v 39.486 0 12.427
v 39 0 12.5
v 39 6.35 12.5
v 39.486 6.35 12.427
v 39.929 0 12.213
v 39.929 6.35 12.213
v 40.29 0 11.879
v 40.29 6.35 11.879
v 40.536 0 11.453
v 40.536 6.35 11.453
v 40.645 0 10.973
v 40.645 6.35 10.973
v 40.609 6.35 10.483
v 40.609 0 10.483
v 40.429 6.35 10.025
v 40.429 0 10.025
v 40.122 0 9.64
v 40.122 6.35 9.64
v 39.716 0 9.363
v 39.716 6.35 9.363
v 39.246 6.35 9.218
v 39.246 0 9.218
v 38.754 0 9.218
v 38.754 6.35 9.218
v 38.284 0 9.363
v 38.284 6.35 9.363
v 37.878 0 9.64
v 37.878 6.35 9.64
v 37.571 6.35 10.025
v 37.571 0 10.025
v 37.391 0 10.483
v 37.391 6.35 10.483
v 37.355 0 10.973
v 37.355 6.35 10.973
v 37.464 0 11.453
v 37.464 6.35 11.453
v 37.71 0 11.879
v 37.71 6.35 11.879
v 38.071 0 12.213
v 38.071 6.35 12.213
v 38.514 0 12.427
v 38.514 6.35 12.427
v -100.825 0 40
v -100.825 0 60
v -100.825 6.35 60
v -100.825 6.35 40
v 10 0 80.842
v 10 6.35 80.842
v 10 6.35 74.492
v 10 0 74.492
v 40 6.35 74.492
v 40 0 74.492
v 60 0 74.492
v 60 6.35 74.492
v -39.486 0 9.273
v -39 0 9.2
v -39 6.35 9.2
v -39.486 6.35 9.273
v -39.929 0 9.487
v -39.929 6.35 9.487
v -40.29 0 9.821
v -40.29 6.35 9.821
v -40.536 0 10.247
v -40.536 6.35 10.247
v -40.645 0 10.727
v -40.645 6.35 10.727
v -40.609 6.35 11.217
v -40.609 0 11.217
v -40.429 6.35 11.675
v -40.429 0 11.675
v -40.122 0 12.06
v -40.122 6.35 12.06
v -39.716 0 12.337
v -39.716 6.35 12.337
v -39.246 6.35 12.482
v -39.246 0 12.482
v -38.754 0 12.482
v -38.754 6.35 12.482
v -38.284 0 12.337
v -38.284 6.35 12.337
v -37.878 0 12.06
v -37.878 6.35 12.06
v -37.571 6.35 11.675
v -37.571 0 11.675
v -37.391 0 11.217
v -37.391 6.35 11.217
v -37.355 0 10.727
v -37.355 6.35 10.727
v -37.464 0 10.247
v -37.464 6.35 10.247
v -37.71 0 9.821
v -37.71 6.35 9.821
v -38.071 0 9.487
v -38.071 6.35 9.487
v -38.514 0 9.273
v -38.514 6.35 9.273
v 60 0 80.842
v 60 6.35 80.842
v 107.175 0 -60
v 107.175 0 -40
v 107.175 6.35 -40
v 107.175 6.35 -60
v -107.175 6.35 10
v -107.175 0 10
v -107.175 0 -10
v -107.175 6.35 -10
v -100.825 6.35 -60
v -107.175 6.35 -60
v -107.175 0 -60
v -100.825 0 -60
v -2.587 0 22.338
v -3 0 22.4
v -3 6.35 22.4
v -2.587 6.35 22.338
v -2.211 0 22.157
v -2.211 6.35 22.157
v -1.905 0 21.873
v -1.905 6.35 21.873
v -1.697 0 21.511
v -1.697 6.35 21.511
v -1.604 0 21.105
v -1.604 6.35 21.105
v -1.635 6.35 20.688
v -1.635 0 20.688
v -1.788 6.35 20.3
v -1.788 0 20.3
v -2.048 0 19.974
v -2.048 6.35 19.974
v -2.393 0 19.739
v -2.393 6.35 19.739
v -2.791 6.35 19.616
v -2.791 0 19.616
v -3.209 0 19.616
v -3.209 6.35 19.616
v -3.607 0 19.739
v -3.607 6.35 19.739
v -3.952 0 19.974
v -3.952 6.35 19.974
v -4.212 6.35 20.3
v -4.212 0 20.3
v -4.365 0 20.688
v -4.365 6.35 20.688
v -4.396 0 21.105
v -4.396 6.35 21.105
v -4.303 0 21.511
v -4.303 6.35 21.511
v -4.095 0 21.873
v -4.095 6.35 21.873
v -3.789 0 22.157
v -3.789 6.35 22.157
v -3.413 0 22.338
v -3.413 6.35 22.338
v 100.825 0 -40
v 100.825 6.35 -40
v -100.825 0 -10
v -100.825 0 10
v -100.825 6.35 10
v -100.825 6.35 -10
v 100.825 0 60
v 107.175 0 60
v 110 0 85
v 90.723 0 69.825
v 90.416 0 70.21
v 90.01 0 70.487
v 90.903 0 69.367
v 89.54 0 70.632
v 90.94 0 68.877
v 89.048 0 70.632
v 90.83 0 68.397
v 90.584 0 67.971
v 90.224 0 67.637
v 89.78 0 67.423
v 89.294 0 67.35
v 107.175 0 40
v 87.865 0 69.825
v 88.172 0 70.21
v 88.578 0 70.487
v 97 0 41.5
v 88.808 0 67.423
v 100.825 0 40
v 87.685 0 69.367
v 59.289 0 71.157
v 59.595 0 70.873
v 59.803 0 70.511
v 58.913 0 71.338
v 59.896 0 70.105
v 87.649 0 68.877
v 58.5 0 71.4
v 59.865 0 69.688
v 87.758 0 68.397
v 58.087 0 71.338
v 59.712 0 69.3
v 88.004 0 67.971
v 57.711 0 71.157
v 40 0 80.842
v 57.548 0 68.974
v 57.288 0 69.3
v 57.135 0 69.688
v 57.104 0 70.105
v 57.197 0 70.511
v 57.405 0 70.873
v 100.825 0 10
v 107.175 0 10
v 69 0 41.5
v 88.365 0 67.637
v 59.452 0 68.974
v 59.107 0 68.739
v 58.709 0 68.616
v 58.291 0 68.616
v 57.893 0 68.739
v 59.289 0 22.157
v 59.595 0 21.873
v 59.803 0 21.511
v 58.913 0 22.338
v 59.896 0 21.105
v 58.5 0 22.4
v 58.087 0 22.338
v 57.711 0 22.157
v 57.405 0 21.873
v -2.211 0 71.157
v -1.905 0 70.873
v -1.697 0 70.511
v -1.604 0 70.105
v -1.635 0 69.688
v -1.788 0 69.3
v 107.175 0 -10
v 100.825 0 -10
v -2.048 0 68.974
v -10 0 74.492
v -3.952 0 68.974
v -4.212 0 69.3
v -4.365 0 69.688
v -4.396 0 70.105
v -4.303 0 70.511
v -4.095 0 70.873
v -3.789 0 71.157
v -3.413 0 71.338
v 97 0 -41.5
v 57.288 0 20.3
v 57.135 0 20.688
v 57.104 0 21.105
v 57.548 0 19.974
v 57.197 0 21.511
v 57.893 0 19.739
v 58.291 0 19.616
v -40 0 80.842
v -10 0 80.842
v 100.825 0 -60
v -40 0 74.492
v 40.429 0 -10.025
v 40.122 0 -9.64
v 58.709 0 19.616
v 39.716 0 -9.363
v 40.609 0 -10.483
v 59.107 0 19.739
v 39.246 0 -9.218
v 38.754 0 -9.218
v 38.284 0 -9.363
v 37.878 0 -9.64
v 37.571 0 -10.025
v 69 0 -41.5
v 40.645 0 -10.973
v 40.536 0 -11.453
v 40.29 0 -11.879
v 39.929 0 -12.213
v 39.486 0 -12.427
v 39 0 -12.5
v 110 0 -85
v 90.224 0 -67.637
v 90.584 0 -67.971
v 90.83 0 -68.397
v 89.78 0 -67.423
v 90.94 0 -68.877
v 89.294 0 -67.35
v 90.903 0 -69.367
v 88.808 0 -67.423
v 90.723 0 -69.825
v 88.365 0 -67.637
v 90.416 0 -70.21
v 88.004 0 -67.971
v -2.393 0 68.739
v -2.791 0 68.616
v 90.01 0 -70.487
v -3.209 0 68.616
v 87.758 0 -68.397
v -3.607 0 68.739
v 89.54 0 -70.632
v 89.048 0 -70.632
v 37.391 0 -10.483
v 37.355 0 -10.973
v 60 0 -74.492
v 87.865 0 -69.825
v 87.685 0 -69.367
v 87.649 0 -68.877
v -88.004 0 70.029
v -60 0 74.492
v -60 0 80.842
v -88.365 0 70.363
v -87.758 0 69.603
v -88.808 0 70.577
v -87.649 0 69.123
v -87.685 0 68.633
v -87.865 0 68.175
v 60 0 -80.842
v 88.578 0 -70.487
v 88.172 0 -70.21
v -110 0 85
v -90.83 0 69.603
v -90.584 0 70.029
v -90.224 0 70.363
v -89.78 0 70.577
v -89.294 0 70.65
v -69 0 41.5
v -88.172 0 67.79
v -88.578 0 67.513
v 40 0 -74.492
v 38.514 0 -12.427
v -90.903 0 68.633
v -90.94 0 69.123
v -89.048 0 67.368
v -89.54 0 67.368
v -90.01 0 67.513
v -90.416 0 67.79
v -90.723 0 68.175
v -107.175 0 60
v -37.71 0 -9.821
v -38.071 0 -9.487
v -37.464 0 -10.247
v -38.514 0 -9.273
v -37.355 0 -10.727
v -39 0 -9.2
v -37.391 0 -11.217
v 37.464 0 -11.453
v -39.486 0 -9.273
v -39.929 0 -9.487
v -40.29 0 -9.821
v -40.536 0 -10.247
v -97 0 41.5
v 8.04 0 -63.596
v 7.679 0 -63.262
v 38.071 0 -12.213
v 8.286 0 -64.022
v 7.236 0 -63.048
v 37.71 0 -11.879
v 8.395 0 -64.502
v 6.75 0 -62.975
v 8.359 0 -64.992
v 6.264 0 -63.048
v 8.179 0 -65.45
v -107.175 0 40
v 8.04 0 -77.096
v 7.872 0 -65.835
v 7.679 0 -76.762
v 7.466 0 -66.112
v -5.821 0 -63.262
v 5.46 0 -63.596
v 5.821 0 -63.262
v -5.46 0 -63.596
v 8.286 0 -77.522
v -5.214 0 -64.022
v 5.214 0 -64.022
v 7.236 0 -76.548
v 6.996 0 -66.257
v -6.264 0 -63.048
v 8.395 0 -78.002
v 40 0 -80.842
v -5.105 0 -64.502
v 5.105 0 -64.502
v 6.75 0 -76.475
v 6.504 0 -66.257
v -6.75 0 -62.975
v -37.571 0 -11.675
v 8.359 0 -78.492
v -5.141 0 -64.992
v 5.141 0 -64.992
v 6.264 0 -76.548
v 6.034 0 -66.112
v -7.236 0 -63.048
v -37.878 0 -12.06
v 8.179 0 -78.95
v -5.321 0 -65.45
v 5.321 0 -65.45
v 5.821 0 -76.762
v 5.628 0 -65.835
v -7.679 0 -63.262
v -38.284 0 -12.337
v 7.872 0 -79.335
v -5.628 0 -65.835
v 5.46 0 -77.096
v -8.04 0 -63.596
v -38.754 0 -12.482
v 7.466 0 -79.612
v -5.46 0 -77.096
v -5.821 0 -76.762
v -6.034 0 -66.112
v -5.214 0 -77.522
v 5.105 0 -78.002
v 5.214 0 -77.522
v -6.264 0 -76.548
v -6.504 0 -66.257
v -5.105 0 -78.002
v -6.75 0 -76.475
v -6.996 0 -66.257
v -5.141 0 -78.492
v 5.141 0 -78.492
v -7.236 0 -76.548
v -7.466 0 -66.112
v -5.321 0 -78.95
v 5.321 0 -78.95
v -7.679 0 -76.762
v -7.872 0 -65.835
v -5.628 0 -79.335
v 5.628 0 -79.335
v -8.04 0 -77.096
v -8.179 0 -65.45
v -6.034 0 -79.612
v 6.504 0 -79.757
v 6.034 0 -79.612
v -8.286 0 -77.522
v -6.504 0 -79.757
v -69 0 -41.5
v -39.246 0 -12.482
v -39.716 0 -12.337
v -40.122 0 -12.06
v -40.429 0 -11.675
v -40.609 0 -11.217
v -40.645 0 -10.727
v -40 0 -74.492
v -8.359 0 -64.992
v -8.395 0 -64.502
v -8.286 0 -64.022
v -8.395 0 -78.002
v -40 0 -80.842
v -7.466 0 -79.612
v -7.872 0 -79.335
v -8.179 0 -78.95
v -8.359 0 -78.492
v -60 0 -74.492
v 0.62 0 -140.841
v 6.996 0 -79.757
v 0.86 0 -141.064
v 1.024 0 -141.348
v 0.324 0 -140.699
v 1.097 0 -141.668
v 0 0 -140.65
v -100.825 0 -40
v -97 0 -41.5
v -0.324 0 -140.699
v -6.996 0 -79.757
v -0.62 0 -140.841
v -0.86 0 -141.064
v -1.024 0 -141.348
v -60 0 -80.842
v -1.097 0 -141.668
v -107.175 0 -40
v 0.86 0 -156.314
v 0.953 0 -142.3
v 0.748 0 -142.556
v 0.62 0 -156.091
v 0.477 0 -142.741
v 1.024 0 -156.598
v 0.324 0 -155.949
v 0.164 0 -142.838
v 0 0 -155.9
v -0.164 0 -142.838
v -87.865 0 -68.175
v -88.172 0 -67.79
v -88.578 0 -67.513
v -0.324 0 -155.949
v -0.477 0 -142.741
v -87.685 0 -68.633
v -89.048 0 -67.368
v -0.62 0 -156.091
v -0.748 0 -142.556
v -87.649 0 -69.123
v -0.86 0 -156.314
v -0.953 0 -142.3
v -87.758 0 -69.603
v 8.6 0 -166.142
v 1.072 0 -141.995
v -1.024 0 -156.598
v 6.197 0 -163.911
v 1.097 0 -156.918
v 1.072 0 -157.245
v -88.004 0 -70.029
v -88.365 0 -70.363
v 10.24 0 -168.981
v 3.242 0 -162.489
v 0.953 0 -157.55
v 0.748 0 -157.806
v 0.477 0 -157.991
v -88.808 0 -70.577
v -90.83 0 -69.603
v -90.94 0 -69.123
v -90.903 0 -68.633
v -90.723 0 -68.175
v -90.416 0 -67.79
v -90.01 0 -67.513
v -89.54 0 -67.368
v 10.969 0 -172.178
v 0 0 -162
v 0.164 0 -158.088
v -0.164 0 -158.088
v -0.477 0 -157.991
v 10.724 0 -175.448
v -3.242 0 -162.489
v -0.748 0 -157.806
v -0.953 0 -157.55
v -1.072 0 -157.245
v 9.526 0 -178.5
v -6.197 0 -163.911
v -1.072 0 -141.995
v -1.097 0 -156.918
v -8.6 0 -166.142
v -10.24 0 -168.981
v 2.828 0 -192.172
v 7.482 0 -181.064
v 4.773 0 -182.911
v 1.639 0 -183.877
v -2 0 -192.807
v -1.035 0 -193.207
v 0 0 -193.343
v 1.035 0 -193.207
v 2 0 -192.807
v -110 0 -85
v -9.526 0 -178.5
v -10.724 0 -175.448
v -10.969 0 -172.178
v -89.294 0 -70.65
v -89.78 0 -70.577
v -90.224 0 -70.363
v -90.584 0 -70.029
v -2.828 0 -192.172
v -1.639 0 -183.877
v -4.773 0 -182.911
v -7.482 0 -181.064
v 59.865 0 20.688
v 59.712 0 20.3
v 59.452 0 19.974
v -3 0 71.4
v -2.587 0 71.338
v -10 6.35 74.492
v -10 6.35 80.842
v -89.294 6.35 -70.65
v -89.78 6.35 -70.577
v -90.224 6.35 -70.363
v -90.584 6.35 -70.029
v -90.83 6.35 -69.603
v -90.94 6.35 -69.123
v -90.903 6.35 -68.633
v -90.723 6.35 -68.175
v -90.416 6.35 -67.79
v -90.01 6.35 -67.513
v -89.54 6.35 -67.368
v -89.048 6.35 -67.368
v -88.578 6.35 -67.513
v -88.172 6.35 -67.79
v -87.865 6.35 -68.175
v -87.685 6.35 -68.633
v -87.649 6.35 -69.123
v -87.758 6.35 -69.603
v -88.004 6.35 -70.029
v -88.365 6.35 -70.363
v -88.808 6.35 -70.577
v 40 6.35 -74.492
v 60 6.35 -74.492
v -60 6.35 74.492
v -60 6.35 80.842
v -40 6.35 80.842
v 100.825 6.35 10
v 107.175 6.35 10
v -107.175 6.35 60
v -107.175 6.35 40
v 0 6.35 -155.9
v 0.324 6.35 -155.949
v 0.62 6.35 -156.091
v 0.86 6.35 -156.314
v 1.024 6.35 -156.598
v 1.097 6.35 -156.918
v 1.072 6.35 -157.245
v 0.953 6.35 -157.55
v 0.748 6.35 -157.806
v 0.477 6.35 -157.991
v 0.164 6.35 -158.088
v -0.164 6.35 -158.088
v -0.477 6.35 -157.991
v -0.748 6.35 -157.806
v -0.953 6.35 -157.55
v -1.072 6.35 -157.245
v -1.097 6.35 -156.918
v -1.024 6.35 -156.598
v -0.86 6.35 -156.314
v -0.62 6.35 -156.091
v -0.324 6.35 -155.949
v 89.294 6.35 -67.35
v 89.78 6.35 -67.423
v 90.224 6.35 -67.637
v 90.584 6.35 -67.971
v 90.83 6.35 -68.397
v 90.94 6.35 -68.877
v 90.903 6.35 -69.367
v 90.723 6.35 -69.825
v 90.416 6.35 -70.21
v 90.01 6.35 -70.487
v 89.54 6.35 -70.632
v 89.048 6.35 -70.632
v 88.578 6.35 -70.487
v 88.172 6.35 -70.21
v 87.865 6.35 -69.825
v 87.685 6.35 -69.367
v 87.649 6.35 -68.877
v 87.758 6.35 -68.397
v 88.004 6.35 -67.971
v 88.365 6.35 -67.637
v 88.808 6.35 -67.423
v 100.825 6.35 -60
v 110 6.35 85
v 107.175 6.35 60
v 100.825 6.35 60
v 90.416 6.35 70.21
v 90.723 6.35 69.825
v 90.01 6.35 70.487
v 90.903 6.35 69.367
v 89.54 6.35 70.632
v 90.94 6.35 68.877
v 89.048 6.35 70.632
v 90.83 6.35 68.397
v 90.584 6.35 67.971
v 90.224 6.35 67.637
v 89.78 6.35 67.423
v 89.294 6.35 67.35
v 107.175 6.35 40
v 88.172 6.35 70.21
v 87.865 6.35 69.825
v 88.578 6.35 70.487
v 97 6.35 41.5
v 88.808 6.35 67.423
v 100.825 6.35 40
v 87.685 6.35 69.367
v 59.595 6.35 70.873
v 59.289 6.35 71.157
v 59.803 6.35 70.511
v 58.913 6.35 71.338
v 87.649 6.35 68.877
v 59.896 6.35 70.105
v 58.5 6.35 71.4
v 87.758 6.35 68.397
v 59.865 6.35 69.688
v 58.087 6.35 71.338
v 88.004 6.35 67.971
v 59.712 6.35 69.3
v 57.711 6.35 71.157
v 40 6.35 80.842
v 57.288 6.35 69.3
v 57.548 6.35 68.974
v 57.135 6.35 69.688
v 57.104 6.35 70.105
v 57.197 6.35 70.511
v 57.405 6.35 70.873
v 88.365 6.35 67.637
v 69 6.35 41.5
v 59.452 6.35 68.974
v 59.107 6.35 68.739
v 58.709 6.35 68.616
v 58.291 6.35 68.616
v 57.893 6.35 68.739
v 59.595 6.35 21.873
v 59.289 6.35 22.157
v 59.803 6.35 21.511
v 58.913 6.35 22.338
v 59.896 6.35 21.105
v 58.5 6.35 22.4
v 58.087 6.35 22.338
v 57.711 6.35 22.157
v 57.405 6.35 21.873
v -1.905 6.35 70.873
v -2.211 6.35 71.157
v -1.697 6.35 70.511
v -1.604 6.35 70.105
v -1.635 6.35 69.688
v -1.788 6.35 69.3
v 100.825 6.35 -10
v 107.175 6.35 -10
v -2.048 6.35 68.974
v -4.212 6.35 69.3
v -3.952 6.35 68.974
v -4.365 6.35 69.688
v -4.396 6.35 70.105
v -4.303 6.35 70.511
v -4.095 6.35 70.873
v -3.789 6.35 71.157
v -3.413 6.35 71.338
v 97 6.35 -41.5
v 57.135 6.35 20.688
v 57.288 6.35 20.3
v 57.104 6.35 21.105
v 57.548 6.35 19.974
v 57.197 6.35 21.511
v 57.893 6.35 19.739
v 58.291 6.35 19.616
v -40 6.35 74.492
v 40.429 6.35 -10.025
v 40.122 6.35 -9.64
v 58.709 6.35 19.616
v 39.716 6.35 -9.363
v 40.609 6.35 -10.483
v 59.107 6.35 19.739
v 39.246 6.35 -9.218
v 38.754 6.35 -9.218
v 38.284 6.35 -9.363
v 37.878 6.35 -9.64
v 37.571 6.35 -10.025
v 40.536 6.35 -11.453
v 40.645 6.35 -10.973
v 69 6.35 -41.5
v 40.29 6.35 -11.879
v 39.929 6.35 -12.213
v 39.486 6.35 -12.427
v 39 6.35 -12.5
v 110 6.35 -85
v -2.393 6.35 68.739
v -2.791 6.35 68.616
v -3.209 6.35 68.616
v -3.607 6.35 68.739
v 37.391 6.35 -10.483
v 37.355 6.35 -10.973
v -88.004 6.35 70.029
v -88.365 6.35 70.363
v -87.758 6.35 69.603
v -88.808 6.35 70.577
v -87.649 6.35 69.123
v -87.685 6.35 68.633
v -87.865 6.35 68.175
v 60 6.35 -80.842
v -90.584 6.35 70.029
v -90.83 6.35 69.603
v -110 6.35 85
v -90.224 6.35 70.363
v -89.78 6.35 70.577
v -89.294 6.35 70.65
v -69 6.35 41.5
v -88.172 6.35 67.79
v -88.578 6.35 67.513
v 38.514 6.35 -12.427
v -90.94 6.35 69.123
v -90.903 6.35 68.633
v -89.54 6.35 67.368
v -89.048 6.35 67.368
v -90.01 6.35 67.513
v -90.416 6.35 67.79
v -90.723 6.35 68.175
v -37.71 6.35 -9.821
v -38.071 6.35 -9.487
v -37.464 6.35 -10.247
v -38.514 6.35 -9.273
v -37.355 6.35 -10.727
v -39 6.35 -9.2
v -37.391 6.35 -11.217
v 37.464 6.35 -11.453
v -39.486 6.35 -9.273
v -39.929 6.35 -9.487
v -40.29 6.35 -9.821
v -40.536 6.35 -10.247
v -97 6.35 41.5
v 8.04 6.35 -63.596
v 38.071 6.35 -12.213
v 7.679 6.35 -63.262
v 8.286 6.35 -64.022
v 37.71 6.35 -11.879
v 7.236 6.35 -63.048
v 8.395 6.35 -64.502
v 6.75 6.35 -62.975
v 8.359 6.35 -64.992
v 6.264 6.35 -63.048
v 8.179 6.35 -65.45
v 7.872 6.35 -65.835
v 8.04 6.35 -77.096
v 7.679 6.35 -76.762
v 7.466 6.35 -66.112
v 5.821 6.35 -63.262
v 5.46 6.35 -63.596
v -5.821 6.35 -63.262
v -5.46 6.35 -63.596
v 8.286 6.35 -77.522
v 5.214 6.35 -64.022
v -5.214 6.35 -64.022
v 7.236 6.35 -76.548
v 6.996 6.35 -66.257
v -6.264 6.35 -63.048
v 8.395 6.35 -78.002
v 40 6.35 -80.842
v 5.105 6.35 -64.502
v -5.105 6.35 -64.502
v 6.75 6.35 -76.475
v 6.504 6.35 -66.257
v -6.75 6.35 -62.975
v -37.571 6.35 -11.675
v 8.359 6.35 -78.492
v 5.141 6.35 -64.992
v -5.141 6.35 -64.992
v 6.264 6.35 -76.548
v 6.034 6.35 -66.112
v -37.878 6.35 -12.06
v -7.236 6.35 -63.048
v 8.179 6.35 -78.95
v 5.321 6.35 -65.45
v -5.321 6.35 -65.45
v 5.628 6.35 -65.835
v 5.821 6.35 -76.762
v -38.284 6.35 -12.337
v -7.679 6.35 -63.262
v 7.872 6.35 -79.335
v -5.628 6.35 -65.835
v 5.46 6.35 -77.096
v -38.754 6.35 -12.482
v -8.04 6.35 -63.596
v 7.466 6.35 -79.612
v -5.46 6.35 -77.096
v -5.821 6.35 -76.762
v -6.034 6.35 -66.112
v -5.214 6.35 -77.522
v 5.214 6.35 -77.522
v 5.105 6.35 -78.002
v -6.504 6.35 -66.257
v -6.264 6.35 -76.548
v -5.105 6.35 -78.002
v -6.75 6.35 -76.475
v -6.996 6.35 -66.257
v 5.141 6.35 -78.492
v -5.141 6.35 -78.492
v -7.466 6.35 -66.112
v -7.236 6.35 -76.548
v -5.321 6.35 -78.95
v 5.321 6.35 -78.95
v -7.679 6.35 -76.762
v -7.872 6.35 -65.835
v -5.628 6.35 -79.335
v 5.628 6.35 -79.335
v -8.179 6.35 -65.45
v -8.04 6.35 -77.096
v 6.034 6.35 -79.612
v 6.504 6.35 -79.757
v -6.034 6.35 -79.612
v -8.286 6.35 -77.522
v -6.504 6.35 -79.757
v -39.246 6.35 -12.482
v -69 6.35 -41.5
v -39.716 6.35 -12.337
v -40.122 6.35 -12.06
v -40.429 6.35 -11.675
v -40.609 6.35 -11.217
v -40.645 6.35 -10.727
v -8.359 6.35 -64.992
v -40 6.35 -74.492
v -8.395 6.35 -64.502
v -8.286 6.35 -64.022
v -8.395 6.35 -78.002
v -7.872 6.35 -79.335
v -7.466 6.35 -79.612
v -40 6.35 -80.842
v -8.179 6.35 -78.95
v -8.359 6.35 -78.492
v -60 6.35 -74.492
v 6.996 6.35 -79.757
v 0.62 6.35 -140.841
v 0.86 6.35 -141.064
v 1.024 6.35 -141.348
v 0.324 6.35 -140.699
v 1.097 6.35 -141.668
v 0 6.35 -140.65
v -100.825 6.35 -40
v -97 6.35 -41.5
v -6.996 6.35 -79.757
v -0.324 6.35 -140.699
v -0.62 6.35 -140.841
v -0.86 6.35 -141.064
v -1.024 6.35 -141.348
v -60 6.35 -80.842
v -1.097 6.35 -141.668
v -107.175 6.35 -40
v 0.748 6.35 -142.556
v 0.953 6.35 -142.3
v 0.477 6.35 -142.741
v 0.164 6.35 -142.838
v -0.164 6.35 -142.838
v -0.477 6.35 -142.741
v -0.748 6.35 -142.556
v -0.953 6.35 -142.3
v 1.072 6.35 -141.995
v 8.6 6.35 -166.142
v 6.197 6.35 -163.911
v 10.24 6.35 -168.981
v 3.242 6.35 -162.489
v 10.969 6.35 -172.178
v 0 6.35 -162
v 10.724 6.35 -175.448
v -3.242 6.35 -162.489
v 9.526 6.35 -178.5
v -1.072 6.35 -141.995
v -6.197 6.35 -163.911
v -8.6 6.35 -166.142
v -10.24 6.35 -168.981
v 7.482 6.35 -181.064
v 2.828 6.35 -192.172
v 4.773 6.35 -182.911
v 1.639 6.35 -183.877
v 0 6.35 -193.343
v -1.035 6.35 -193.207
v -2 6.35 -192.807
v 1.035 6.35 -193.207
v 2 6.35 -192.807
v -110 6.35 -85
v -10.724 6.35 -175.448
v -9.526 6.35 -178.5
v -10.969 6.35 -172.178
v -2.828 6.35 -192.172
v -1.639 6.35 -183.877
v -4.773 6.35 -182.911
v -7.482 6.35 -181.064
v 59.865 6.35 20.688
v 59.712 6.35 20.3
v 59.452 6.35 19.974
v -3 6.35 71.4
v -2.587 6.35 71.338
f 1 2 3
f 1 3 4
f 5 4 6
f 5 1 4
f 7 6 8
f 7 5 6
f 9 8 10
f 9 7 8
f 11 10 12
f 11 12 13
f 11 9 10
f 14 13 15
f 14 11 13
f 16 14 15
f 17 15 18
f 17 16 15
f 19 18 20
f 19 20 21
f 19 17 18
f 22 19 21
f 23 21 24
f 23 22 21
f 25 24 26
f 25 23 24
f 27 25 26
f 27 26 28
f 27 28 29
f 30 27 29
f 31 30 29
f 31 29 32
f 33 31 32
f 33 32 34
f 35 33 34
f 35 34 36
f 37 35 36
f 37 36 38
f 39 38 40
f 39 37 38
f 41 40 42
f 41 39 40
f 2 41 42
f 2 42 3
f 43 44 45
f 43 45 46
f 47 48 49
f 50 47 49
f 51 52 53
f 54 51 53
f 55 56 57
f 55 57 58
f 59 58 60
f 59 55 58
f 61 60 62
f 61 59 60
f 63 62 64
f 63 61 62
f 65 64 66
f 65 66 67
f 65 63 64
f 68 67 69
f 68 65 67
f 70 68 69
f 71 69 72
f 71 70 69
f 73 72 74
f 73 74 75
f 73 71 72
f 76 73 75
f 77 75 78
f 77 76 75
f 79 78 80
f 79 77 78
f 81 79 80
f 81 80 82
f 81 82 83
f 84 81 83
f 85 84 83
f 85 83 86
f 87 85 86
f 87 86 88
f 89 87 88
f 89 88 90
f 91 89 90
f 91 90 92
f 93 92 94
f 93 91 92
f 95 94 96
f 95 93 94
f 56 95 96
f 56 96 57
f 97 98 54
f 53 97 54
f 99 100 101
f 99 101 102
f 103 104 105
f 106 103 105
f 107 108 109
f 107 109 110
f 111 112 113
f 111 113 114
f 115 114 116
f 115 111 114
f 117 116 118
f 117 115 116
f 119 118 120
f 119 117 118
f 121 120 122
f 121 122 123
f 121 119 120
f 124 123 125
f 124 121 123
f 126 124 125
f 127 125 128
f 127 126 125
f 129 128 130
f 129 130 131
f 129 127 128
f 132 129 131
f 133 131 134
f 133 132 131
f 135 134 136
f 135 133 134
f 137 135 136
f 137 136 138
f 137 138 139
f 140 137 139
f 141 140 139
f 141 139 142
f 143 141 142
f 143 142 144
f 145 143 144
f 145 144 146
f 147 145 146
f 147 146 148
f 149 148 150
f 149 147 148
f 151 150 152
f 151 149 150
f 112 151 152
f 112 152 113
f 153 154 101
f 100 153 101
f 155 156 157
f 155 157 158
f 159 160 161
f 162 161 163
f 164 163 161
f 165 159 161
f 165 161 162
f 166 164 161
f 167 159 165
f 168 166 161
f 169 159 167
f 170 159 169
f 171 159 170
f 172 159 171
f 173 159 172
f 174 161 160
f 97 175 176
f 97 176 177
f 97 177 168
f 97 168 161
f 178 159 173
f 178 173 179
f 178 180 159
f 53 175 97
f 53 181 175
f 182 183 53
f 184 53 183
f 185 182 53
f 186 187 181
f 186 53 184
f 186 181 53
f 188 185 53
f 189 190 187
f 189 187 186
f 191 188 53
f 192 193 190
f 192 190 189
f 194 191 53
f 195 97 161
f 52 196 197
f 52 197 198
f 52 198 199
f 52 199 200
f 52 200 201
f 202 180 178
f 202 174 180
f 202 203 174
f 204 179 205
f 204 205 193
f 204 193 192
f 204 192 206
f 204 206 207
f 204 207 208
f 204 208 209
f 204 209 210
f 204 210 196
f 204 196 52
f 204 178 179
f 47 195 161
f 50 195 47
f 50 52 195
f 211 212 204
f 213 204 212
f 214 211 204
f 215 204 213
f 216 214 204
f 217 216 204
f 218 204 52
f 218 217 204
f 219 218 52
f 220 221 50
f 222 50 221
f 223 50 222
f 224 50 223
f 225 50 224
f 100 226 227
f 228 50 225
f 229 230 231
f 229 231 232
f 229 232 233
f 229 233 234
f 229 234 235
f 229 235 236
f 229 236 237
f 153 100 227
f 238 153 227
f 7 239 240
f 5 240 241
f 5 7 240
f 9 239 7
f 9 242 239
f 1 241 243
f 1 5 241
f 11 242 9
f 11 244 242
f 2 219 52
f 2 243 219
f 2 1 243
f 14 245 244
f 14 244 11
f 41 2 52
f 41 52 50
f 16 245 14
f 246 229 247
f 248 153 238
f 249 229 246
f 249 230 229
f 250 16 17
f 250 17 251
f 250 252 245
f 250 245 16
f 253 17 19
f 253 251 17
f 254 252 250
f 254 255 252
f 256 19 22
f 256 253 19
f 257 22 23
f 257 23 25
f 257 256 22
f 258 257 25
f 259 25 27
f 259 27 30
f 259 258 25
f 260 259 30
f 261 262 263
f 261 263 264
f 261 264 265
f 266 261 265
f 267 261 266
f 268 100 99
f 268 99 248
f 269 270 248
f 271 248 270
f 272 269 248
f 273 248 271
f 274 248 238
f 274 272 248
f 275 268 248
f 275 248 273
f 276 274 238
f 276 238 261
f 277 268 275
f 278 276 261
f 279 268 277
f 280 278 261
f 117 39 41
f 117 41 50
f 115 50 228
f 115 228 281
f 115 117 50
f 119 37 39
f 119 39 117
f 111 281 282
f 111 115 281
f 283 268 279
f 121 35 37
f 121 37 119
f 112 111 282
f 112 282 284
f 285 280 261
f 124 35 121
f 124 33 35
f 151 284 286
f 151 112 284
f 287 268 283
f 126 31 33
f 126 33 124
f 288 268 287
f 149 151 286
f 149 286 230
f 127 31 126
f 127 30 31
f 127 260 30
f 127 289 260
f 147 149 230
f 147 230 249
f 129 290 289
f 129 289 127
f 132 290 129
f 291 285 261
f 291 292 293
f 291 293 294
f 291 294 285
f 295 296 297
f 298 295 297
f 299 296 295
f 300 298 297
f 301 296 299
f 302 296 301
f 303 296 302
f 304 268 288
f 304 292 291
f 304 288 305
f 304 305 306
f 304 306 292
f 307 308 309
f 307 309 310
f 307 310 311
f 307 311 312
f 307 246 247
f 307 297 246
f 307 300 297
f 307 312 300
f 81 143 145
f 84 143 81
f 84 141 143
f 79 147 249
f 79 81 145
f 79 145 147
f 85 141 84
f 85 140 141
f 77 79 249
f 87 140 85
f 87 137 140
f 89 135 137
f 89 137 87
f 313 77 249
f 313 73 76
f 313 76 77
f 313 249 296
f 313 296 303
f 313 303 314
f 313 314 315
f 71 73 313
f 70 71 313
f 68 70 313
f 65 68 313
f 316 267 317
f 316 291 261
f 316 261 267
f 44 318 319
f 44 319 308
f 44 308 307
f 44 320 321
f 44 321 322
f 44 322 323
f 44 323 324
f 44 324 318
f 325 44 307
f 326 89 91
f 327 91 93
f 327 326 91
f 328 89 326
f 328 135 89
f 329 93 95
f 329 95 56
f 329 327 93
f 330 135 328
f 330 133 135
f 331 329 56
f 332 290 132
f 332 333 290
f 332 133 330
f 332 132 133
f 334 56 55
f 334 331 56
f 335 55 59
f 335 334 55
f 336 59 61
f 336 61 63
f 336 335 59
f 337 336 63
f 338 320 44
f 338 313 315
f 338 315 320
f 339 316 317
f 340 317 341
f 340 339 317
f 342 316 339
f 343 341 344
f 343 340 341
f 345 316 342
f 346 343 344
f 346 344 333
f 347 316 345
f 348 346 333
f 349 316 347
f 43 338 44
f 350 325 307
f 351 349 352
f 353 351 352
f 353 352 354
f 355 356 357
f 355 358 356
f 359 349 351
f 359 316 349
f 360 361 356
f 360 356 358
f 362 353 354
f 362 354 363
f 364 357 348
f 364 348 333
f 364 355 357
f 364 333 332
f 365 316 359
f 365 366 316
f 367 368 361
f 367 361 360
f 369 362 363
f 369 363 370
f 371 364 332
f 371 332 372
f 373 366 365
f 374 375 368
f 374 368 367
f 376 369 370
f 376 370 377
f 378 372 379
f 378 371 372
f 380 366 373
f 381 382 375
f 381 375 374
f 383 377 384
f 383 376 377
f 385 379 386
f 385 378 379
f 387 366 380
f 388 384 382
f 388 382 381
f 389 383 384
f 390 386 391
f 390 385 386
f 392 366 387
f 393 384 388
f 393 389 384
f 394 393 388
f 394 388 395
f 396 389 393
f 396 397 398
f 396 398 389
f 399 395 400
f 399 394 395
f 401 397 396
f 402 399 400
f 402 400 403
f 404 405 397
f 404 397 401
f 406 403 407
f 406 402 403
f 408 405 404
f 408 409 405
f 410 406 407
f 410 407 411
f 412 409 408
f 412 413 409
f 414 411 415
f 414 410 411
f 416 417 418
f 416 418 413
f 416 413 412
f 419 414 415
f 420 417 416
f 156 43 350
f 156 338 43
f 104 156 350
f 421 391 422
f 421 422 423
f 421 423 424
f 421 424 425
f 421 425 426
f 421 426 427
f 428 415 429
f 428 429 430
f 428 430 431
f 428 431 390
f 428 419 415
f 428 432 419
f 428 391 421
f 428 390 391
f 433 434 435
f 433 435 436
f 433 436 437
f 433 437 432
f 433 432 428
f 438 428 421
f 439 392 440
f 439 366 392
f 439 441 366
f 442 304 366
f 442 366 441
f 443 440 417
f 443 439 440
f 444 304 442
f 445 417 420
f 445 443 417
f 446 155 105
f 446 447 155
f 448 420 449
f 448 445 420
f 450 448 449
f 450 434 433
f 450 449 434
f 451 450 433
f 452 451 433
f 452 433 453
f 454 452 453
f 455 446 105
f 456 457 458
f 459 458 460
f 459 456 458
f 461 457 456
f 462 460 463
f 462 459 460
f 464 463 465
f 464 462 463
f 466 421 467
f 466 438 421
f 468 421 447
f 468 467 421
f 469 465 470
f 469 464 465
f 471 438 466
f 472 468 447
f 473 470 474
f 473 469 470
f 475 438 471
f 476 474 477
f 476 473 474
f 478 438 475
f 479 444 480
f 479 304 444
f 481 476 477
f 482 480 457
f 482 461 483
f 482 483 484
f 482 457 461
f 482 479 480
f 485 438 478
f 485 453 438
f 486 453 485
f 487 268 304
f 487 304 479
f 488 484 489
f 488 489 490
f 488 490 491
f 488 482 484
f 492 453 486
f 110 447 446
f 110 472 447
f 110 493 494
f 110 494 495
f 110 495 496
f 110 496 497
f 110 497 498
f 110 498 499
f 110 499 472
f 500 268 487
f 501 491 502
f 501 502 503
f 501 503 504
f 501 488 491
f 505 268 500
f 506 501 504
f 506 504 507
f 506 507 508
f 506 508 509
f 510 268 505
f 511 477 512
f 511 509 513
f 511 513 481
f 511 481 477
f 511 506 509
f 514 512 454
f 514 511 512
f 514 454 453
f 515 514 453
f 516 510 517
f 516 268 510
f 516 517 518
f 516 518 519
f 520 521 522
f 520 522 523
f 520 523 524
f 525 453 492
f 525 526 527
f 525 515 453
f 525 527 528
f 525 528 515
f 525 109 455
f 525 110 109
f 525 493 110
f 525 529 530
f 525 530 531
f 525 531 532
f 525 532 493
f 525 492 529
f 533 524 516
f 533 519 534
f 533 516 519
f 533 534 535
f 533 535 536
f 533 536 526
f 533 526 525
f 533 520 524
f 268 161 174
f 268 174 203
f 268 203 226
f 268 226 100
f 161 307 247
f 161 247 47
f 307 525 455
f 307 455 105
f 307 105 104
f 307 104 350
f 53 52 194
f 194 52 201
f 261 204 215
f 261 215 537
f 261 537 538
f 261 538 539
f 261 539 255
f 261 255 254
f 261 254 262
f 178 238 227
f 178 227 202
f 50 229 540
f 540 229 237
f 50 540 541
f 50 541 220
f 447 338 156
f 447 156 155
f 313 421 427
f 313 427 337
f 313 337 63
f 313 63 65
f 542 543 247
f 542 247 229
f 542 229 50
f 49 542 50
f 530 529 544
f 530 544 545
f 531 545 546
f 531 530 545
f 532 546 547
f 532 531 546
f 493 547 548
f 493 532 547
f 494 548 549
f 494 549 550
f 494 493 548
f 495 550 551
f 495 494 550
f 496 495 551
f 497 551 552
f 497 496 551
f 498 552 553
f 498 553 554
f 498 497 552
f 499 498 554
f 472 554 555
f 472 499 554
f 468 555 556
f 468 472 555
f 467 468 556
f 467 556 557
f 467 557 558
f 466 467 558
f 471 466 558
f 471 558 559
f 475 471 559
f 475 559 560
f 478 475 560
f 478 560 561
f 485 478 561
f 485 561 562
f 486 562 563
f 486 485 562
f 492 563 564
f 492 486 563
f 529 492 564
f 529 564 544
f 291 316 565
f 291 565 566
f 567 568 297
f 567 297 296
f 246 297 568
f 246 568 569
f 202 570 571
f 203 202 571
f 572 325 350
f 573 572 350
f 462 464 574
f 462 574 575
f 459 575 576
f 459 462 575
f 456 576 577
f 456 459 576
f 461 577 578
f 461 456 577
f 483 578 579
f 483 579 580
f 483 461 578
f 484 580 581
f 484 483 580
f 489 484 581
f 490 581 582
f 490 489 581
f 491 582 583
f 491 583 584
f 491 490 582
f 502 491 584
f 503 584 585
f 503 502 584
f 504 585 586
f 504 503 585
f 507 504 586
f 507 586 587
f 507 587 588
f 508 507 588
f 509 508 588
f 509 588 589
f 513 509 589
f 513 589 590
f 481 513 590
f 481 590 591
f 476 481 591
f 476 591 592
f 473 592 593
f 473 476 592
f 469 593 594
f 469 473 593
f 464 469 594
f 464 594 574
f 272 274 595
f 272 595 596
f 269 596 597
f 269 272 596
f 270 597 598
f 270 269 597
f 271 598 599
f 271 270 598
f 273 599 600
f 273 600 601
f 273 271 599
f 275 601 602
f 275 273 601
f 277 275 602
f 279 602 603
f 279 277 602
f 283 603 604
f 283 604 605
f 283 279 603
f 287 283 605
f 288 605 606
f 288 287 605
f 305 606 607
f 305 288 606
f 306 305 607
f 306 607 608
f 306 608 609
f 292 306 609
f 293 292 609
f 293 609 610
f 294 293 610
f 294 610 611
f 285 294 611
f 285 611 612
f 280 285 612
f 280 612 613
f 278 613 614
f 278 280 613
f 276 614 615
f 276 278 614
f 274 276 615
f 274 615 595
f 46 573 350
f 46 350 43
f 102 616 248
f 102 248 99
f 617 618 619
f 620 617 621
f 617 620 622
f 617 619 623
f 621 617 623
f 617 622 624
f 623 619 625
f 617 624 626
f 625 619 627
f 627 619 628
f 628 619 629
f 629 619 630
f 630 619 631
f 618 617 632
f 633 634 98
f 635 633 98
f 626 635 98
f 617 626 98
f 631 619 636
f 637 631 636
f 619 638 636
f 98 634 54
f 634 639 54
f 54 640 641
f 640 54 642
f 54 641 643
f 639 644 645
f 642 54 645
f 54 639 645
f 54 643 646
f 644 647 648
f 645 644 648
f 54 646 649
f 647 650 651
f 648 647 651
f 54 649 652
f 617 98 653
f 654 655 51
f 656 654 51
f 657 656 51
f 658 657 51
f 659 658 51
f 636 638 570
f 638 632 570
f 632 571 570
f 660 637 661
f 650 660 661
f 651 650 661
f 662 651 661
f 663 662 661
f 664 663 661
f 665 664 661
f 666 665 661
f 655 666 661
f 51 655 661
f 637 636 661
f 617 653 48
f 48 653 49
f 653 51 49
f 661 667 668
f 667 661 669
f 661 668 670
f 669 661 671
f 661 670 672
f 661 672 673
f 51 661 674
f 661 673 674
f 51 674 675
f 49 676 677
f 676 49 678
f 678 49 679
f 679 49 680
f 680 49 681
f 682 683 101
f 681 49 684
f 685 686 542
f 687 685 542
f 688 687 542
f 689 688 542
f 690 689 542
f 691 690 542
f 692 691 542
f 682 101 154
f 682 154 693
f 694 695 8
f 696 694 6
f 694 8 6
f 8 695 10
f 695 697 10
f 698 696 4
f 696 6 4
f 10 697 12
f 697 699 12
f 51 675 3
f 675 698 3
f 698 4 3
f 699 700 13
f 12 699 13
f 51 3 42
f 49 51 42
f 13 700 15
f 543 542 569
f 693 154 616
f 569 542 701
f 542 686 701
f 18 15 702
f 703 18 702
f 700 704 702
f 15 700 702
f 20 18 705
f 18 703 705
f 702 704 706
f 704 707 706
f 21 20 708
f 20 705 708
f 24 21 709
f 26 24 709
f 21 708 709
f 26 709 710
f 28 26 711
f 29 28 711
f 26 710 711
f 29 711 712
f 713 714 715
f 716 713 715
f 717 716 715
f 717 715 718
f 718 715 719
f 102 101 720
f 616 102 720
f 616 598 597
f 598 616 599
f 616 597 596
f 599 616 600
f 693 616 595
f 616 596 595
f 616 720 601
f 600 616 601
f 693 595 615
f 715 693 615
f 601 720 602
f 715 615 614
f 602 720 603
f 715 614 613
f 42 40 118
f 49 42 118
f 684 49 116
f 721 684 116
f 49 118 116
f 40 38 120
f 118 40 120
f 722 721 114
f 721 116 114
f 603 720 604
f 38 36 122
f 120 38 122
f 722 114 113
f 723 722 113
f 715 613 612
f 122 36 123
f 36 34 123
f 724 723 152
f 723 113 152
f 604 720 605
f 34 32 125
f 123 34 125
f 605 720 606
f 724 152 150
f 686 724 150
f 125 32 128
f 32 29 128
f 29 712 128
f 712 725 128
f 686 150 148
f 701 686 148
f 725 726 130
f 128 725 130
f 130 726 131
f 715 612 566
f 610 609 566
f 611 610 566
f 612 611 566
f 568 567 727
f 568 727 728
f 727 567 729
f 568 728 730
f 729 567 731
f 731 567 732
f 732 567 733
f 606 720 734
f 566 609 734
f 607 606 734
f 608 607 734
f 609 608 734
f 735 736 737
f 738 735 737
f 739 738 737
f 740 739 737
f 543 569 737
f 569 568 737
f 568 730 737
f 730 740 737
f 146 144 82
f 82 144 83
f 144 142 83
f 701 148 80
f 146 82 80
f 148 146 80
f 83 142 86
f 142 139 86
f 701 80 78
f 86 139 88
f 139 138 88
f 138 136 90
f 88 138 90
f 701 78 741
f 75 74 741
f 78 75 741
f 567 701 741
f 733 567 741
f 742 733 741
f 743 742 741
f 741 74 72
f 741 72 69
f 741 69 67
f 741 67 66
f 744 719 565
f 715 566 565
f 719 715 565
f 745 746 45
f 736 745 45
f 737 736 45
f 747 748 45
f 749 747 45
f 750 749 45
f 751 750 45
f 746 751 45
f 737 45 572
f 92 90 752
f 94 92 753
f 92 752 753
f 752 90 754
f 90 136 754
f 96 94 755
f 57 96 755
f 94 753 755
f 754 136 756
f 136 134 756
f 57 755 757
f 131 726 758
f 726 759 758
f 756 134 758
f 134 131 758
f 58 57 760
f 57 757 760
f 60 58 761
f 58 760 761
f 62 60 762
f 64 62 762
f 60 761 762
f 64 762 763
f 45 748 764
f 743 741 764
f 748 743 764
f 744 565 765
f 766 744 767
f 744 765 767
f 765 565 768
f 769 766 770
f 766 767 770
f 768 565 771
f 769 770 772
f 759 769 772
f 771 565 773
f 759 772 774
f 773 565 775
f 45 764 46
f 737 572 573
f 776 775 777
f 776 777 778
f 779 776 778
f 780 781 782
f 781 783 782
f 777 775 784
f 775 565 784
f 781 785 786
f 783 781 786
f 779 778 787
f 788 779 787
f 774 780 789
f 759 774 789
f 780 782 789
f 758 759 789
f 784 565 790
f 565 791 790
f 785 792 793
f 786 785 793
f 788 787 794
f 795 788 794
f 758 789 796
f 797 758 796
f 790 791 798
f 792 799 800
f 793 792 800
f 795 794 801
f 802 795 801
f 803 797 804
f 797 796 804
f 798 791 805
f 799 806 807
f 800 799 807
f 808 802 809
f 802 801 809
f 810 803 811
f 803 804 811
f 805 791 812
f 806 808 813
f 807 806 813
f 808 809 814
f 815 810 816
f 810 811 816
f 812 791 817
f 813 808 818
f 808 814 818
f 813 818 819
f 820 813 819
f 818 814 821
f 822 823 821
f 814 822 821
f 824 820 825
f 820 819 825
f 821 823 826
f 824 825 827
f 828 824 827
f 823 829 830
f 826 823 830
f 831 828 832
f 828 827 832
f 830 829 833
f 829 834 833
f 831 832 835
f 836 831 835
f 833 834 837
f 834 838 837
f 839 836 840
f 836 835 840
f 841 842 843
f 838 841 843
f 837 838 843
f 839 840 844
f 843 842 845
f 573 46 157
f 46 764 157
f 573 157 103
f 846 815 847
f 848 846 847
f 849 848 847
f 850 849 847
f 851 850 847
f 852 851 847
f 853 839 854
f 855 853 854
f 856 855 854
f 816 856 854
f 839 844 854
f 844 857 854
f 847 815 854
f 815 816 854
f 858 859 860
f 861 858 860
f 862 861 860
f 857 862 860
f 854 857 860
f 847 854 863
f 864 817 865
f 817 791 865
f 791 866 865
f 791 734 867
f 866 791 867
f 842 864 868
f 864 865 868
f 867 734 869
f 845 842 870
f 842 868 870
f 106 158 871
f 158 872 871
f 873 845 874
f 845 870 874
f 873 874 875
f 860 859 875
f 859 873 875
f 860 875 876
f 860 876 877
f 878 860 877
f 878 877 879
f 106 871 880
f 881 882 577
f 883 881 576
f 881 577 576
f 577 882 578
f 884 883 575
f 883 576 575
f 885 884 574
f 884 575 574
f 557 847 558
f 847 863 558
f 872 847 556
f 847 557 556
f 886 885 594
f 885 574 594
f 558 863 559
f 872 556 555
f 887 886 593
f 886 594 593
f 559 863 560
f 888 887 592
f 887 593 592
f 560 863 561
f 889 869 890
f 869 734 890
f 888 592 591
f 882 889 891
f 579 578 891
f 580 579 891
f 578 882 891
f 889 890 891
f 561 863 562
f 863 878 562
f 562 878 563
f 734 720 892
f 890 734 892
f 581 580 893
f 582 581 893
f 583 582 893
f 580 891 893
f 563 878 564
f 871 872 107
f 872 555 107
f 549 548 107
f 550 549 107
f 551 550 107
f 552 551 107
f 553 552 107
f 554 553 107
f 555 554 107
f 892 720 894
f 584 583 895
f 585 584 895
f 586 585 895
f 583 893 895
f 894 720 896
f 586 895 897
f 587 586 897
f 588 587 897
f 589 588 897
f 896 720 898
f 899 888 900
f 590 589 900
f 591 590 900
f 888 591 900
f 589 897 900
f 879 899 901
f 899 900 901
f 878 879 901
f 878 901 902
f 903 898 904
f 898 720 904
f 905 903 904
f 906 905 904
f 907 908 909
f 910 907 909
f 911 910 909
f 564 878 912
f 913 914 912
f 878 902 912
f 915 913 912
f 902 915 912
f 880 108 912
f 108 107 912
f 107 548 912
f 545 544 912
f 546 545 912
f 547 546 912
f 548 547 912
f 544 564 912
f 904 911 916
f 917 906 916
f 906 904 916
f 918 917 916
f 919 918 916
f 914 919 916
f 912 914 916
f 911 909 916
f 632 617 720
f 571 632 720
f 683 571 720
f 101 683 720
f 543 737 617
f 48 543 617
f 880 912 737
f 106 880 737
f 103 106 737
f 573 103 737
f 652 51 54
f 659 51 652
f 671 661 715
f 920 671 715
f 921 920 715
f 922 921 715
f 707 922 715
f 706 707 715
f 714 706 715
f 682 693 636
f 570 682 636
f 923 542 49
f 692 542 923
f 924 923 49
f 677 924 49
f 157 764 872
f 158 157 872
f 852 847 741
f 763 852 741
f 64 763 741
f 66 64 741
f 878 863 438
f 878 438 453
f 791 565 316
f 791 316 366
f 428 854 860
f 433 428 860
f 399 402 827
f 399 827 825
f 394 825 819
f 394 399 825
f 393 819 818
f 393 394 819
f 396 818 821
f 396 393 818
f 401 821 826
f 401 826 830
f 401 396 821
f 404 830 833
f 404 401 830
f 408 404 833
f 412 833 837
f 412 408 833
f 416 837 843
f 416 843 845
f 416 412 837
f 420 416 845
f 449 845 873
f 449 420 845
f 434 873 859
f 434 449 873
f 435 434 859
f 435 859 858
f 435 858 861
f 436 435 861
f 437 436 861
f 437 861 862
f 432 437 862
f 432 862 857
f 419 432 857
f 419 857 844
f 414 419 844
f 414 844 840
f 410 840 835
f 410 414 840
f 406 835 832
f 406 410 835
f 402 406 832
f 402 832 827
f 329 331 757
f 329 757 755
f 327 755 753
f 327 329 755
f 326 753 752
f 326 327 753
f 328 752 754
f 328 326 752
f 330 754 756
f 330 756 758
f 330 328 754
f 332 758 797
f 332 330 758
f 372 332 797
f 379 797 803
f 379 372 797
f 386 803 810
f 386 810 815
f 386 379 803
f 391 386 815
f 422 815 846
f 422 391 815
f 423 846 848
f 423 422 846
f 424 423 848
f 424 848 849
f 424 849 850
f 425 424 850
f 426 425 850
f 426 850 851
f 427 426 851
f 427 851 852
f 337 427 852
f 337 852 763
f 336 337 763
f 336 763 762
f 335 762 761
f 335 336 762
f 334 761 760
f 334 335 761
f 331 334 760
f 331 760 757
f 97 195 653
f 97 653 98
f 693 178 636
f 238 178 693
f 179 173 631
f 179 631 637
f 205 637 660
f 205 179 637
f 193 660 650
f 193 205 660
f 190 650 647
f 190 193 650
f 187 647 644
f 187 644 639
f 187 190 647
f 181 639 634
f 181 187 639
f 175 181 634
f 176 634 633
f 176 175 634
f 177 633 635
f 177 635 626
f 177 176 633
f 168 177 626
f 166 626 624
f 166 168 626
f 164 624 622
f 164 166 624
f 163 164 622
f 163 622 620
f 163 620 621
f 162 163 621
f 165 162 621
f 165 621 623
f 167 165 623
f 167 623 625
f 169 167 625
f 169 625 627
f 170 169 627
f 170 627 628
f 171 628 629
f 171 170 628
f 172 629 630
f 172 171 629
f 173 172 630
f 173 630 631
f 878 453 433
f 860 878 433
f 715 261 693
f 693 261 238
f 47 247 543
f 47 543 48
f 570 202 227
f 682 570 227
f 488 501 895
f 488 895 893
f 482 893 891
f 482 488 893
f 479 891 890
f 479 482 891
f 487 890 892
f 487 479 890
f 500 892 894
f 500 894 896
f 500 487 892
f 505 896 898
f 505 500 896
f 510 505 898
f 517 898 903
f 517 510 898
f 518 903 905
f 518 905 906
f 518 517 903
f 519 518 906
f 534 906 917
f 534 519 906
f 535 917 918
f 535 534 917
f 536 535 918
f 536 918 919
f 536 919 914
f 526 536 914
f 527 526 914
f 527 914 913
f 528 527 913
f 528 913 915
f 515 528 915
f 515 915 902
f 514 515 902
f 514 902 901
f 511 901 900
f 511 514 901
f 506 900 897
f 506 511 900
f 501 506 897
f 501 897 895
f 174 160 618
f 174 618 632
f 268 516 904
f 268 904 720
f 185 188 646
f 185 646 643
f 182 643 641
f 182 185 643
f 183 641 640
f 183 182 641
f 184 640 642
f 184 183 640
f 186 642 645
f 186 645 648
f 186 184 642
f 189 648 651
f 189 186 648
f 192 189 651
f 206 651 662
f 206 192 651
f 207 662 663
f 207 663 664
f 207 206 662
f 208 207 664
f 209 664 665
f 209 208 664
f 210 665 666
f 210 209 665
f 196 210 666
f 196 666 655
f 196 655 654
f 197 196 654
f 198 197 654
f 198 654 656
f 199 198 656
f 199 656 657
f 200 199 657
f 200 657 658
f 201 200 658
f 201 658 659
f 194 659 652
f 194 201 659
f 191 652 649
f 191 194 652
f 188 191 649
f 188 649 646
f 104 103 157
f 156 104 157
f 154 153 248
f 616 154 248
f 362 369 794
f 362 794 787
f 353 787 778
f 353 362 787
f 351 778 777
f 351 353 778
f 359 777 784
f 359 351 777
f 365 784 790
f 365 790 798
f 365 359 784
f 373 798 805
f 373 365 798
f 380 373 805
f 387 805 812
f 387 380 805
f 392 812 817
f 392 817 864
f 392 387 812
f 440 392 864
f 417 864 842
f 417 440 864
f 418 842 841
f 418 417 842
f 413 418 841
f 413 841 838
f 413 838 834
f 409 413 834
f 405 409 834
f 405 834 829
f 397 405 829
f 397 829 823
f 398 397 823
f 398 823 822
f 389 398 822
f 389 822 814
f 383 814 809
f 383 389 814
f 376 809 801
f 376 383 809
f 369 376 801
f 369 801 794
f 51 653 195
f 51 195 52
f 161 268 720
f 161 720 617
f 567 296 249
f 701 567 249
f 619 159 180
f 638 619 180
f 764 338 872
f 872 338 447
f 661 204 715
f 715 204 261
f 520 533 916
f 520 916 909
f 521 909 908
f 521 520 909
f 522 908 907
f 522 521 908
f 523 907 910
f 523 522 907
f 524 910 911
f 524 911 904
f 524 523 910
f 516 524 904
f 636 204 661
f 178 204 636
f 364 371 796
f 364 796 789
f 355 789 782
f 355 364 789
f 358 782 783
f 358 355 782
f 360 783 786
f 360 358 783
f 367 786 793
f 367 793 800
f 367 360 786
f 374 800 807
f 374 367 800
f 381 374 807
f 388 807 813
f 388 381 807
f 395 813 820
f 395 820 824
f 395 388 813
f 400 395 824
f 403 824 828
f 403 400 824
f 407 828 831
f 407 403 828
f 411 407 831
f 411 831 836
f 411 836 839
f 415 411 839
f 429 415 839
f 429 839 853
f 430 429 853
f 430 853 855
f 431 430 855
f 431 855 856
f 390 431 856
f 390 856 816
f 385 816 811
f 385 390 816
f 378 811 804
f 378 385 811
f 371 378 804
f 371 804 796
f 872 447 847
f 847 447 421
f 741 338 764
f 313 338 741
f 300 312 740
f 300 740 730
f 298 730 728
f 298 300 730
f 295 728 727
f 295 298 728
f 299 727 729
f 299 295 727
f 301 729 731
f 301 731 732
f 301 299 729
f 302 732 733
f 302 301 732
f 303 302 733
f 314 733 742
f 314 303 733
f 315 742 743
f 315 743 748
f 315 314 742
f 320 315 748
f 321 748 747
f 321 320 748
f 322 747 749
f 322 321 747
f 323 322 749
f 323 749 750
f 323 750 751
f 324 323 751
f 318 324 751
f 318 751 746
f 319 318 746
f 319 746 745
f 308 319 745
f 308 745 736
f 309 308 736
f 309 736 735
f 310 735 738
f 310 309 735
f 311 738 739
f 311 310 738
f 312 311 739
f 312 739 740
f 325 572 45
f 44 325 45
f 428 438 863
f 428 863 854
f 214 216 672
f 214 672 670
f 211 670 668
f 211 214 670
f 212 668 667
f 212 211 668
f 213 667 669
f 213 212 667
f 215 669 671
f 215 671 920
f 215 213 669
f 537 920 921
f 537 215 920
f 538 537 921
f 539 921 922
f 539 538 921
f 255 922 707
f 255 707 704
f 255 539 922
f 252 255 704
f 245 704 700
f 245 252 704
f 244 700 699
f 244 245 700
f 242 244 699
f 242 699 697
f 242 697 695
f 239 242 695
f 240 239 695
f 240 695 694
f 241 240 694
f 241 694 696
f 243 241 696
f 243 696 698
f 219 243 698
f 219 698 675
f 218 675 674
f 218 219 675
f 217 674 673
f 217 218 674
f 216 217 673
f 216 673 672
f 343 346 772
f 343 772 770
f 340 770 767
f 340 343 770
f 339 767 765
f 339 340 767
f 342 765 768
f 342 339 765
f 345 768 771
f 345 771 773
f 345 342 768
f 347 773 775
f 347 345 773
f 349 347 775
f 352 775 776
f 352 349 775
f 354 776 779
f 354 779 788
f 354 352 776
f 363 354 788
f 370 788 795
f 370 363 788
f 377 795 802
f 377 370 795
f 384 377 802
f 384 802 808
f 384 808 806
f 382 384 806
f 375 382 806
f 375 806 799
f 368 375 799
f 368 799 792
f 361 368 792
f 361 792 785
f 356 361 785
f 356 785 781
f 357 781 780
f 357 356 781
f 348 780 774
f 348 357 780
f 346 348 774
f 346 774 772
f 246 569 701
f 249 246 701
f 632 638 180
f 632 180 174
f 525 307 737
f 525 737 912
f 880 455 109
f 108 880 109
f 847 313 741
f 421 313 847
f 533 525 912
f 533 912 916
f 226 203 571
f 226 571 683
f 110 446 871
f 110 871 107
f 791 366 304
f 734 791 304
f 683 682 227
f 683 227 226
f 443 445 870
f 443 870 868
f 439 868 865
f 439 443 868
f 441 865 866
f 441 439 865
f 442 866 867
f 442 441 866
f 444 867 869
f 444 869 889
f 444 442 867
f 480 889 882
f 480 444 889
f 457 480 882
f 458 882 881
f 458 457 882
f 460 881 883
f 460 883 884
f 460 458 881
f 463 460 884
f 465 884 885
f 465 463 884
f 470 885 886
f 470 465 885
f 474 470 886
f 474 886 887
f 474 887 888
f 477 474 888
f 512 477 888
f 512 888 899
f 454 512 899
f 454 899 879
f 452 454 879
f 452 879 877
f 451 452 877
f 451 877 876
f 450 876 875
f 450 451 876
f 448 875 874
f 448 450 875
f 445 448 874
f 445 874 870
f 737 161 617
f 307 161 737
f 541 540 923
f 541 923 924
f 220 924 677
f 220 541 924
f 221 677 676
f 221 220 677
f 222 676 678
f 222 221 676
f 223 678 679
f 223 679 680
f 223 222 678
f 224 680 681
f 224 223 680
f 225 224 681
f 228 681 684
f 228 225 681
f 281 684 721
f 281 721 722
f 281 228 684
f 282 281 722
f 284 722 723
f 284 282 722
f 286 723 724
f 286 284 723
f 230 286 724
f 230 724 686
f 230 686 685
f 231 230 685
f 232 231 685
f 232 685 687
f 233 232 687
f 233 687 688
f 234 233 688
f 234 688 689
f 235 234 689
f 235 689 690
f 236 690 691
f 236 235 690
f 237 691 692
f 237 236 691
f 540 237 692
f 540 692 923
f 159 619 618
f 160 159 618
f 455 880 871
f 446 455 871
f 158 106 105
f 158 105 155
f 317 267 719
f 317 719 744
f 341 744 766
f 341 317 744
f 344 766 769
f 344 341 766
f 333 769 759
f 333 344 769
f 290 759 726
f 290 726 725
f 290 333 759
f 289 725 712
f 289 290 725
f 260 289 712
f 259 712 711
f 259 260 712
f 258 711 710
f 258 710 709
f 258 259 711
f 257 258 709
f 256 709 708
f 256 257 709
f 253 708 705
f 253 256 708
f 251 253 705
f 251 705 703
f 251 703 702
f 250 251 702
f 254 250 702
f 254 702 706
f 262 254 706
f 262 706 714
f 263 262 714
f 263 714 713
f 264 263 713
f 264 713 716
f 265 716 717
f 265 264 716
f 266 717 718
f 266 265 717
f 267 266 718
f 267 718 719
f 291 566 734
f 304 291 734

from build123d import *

# Parameters (mm, degrees)
SKETCH1_R           = 1.65
SKETCH1_R_2         = 1.1
SKETCH1_R_3         = 1.4
SKETCH1_R_4         = 11
SKETCH1_W           = 28
SKETCH1_H           = 83
SKETCH1_W_2         = 6.35
SKETCH1_H_2         = 20
SKETCH1_W_3         = 20
SKETCH1_H_3         = 6.35
BOSS_EXTRUDE1_DEPTH = 6.35


with BuildPart() as part:
    # Sketch1 → Boss-Extrude1 (new body)
    with BuildSketch(Plane(origin=(0, 0, 0), x_dir=(1, 0, 0), z_dir=(0, 1, 0))):
        with BuildLine():
            Line((-110, 85), (-2.828427125, 192.171572875))
            ThreePointArc((-2.828427125, 192.171572875), (0, 193.343145751), (2.828427125, 192.171572875))
            Line((2.828427125, 192.171572875), (110, 85))
            Line((110, 85), (110, -85))
            Line((110, -85), (-110, -85))
            Line((-110, -85), (-110, 85))
        make_face()
        with Locations(Location((-39, 10.85, 0), (0, 0, 270))):
            Circle(SKETCH1_R, mode=Mode.SUBTRACT)
        with Locations(Location((-39, -10.85, 0), (0, 0, 90))):
            Circle(SKETCH1_R, mode=Mode.SUBTRACT)
        with Locations(Location((-89.294117647, -69, 0), (0, 0, 270))):
            Circle(SKETCH1_R, mode=Mode.SUBTRACT)
        with Locations(Location((89.294117647, -69, 0), (0, 0, 90))):
            Circle(SKETCH1_R, mode=Mode.SUBTRACT)
        with Locations(Location((-89.294117647, 69, 0), (0, 0, 90))):
            Circle(SKETCH1_R, mode=Mode.SUBTRACT)
        with Locations(Location((89.294117647, 69, 0), (0, 0, 270))):
            Circle(SKETCH1_R, mode=Mode.SUBTRACT)
        with Locations(Location((39, -10.85, 0), (0, 0, 270))):
            Circle(SKETCH1_R, mode=Mode.SUBTRACT)
        with Locations(Location((39, 10.85, 0), (0, 0, 90))):
            Circle(SKETCH1_R, mode=Mode.SUBTRACT)
        with Locations(Location((0, 157, 0), (0, 0, 270))):
            Circle(SKETCH1_R_2, mode=Mode.SUBTRACT)
        with Locations(Location((0, 141.75, 0), (0, 0, 270))):
            Circle(SKETCH1_R_2, mode=Mode.SUBTRACT)
        with Locations(Location((-3, -21, 0), (0, 0, 270))):
            Circle(SKETCH1_R_3, mode=Mode.SUBTRACT)
        with Locations(Location((-3, -70, 0), (0, 0, 270))):
            Circle(SKETCH1_R_3, mode=Mode.SUBTRACT)
        with Locations(Location((58.5, -70, 0), (0, 0, 270))):
            Circle(SKETCH1_R_3, mode=Mode.SUBTRACT)
        with Locations(Location((58.5, -21, 0), (0, 0, 270))):
            Circle(SKETCH1_R_3, mode=Mode.SUBTRACT)
        with Locations(Location((-6.75, 78.125, 0), (0, 0, 270))):
            Circle(SKETCH1_R, mode=Mode.SUBTRACT)
        with Locations(Location((6.75, 78.125, 0), (0, 0, 270))):
            Circle(SKETCH1_R, mode=Mode.SUBTRACT)
        with Locations(Location((6.75, 64.625, 0), (0, 0, 270))):
            Circle(SKETCH1_R, mode=Mode.SUBTRACT)
        with Locations(Location((-6.75, 64.625, 0), (0, 0, 270))):
            Circle(SKETCH1_R, mode=Mode.SUBTRACT)
        with Locations(Location((0, 173, 0), (0, 0, 270))):
            Circle(SKETCH1_R_4, mode=Mode.SUBTRACT)
        with Locations((-83, 0)):
            Rectangle(SKETCH1_W, SKETCH1_H, mode=Mode.SUBTRACT)
        with Locations((-104, 50)):
            Rectangle(SKETCH1_W_2, SKETCH1_H_2, mode=Mode.SUBTRACT)
        with Locations((-104, 0)):
            Rectangle(SKETCH1_W_2, SKETCH1_H_2, mode=Mode.SUBTRACT)
        with Locations((-104, -50)):
            Rectangle(SKETCH1_W_2, SKETCH1_H_2, mode=Mode.SUBTRACT)
        with Locations((50, -77.667136592)):
            Rectangle(SKETCH1_W_3, SKETCH1_H_3, mode=Mode.SUBTRACT)
        with Locations((0, -77.667136592)):
            Rectangle(SKETCH1_W_3, SKETCH1_H_3, mode=Mode.SUBTRACT)
        with Locations((-50, -77.667136592)):
            Rectangle(SKETCH1_W_3, SKETCH1_H_3, mode=Mode.SUBTRACT)
        with Locations((104, -50)):
            Rectangle(SKETCH1_W_2, SKETCH1_H_2, mode=Mode.SUBTRACT)
        with Locations((104, 50)):
            Rectangle(SKETCH1_W_2, SKETCH1_H_2, mode=Mode.SUBTRACT)
        with Locations((104, 0)):
            Rectangle(SKETCH1_W_2, SKETCH1_H_2, mode=Mode.SUBTRACT)
        with Locations((-50, 77.667136592)):
            Rectangle(SKETCH1_W_3, SKETCH1_H_3, mode=Mode.SUBTRACT)
        with Locations((50, 77.667136592)):
            Rectangle(SKETCH1_W_3, SKETCH1_H_3, mode=Mode.SUBTRACT)
        with Locations((83, 0)):
            Rectangle(SKETCH1_W, SKETCH1_H, mode=Mode.SUBTRACT)
    extrude(amount=BOSS_EXTRUDE1_DEPTH)


solid = part.part
